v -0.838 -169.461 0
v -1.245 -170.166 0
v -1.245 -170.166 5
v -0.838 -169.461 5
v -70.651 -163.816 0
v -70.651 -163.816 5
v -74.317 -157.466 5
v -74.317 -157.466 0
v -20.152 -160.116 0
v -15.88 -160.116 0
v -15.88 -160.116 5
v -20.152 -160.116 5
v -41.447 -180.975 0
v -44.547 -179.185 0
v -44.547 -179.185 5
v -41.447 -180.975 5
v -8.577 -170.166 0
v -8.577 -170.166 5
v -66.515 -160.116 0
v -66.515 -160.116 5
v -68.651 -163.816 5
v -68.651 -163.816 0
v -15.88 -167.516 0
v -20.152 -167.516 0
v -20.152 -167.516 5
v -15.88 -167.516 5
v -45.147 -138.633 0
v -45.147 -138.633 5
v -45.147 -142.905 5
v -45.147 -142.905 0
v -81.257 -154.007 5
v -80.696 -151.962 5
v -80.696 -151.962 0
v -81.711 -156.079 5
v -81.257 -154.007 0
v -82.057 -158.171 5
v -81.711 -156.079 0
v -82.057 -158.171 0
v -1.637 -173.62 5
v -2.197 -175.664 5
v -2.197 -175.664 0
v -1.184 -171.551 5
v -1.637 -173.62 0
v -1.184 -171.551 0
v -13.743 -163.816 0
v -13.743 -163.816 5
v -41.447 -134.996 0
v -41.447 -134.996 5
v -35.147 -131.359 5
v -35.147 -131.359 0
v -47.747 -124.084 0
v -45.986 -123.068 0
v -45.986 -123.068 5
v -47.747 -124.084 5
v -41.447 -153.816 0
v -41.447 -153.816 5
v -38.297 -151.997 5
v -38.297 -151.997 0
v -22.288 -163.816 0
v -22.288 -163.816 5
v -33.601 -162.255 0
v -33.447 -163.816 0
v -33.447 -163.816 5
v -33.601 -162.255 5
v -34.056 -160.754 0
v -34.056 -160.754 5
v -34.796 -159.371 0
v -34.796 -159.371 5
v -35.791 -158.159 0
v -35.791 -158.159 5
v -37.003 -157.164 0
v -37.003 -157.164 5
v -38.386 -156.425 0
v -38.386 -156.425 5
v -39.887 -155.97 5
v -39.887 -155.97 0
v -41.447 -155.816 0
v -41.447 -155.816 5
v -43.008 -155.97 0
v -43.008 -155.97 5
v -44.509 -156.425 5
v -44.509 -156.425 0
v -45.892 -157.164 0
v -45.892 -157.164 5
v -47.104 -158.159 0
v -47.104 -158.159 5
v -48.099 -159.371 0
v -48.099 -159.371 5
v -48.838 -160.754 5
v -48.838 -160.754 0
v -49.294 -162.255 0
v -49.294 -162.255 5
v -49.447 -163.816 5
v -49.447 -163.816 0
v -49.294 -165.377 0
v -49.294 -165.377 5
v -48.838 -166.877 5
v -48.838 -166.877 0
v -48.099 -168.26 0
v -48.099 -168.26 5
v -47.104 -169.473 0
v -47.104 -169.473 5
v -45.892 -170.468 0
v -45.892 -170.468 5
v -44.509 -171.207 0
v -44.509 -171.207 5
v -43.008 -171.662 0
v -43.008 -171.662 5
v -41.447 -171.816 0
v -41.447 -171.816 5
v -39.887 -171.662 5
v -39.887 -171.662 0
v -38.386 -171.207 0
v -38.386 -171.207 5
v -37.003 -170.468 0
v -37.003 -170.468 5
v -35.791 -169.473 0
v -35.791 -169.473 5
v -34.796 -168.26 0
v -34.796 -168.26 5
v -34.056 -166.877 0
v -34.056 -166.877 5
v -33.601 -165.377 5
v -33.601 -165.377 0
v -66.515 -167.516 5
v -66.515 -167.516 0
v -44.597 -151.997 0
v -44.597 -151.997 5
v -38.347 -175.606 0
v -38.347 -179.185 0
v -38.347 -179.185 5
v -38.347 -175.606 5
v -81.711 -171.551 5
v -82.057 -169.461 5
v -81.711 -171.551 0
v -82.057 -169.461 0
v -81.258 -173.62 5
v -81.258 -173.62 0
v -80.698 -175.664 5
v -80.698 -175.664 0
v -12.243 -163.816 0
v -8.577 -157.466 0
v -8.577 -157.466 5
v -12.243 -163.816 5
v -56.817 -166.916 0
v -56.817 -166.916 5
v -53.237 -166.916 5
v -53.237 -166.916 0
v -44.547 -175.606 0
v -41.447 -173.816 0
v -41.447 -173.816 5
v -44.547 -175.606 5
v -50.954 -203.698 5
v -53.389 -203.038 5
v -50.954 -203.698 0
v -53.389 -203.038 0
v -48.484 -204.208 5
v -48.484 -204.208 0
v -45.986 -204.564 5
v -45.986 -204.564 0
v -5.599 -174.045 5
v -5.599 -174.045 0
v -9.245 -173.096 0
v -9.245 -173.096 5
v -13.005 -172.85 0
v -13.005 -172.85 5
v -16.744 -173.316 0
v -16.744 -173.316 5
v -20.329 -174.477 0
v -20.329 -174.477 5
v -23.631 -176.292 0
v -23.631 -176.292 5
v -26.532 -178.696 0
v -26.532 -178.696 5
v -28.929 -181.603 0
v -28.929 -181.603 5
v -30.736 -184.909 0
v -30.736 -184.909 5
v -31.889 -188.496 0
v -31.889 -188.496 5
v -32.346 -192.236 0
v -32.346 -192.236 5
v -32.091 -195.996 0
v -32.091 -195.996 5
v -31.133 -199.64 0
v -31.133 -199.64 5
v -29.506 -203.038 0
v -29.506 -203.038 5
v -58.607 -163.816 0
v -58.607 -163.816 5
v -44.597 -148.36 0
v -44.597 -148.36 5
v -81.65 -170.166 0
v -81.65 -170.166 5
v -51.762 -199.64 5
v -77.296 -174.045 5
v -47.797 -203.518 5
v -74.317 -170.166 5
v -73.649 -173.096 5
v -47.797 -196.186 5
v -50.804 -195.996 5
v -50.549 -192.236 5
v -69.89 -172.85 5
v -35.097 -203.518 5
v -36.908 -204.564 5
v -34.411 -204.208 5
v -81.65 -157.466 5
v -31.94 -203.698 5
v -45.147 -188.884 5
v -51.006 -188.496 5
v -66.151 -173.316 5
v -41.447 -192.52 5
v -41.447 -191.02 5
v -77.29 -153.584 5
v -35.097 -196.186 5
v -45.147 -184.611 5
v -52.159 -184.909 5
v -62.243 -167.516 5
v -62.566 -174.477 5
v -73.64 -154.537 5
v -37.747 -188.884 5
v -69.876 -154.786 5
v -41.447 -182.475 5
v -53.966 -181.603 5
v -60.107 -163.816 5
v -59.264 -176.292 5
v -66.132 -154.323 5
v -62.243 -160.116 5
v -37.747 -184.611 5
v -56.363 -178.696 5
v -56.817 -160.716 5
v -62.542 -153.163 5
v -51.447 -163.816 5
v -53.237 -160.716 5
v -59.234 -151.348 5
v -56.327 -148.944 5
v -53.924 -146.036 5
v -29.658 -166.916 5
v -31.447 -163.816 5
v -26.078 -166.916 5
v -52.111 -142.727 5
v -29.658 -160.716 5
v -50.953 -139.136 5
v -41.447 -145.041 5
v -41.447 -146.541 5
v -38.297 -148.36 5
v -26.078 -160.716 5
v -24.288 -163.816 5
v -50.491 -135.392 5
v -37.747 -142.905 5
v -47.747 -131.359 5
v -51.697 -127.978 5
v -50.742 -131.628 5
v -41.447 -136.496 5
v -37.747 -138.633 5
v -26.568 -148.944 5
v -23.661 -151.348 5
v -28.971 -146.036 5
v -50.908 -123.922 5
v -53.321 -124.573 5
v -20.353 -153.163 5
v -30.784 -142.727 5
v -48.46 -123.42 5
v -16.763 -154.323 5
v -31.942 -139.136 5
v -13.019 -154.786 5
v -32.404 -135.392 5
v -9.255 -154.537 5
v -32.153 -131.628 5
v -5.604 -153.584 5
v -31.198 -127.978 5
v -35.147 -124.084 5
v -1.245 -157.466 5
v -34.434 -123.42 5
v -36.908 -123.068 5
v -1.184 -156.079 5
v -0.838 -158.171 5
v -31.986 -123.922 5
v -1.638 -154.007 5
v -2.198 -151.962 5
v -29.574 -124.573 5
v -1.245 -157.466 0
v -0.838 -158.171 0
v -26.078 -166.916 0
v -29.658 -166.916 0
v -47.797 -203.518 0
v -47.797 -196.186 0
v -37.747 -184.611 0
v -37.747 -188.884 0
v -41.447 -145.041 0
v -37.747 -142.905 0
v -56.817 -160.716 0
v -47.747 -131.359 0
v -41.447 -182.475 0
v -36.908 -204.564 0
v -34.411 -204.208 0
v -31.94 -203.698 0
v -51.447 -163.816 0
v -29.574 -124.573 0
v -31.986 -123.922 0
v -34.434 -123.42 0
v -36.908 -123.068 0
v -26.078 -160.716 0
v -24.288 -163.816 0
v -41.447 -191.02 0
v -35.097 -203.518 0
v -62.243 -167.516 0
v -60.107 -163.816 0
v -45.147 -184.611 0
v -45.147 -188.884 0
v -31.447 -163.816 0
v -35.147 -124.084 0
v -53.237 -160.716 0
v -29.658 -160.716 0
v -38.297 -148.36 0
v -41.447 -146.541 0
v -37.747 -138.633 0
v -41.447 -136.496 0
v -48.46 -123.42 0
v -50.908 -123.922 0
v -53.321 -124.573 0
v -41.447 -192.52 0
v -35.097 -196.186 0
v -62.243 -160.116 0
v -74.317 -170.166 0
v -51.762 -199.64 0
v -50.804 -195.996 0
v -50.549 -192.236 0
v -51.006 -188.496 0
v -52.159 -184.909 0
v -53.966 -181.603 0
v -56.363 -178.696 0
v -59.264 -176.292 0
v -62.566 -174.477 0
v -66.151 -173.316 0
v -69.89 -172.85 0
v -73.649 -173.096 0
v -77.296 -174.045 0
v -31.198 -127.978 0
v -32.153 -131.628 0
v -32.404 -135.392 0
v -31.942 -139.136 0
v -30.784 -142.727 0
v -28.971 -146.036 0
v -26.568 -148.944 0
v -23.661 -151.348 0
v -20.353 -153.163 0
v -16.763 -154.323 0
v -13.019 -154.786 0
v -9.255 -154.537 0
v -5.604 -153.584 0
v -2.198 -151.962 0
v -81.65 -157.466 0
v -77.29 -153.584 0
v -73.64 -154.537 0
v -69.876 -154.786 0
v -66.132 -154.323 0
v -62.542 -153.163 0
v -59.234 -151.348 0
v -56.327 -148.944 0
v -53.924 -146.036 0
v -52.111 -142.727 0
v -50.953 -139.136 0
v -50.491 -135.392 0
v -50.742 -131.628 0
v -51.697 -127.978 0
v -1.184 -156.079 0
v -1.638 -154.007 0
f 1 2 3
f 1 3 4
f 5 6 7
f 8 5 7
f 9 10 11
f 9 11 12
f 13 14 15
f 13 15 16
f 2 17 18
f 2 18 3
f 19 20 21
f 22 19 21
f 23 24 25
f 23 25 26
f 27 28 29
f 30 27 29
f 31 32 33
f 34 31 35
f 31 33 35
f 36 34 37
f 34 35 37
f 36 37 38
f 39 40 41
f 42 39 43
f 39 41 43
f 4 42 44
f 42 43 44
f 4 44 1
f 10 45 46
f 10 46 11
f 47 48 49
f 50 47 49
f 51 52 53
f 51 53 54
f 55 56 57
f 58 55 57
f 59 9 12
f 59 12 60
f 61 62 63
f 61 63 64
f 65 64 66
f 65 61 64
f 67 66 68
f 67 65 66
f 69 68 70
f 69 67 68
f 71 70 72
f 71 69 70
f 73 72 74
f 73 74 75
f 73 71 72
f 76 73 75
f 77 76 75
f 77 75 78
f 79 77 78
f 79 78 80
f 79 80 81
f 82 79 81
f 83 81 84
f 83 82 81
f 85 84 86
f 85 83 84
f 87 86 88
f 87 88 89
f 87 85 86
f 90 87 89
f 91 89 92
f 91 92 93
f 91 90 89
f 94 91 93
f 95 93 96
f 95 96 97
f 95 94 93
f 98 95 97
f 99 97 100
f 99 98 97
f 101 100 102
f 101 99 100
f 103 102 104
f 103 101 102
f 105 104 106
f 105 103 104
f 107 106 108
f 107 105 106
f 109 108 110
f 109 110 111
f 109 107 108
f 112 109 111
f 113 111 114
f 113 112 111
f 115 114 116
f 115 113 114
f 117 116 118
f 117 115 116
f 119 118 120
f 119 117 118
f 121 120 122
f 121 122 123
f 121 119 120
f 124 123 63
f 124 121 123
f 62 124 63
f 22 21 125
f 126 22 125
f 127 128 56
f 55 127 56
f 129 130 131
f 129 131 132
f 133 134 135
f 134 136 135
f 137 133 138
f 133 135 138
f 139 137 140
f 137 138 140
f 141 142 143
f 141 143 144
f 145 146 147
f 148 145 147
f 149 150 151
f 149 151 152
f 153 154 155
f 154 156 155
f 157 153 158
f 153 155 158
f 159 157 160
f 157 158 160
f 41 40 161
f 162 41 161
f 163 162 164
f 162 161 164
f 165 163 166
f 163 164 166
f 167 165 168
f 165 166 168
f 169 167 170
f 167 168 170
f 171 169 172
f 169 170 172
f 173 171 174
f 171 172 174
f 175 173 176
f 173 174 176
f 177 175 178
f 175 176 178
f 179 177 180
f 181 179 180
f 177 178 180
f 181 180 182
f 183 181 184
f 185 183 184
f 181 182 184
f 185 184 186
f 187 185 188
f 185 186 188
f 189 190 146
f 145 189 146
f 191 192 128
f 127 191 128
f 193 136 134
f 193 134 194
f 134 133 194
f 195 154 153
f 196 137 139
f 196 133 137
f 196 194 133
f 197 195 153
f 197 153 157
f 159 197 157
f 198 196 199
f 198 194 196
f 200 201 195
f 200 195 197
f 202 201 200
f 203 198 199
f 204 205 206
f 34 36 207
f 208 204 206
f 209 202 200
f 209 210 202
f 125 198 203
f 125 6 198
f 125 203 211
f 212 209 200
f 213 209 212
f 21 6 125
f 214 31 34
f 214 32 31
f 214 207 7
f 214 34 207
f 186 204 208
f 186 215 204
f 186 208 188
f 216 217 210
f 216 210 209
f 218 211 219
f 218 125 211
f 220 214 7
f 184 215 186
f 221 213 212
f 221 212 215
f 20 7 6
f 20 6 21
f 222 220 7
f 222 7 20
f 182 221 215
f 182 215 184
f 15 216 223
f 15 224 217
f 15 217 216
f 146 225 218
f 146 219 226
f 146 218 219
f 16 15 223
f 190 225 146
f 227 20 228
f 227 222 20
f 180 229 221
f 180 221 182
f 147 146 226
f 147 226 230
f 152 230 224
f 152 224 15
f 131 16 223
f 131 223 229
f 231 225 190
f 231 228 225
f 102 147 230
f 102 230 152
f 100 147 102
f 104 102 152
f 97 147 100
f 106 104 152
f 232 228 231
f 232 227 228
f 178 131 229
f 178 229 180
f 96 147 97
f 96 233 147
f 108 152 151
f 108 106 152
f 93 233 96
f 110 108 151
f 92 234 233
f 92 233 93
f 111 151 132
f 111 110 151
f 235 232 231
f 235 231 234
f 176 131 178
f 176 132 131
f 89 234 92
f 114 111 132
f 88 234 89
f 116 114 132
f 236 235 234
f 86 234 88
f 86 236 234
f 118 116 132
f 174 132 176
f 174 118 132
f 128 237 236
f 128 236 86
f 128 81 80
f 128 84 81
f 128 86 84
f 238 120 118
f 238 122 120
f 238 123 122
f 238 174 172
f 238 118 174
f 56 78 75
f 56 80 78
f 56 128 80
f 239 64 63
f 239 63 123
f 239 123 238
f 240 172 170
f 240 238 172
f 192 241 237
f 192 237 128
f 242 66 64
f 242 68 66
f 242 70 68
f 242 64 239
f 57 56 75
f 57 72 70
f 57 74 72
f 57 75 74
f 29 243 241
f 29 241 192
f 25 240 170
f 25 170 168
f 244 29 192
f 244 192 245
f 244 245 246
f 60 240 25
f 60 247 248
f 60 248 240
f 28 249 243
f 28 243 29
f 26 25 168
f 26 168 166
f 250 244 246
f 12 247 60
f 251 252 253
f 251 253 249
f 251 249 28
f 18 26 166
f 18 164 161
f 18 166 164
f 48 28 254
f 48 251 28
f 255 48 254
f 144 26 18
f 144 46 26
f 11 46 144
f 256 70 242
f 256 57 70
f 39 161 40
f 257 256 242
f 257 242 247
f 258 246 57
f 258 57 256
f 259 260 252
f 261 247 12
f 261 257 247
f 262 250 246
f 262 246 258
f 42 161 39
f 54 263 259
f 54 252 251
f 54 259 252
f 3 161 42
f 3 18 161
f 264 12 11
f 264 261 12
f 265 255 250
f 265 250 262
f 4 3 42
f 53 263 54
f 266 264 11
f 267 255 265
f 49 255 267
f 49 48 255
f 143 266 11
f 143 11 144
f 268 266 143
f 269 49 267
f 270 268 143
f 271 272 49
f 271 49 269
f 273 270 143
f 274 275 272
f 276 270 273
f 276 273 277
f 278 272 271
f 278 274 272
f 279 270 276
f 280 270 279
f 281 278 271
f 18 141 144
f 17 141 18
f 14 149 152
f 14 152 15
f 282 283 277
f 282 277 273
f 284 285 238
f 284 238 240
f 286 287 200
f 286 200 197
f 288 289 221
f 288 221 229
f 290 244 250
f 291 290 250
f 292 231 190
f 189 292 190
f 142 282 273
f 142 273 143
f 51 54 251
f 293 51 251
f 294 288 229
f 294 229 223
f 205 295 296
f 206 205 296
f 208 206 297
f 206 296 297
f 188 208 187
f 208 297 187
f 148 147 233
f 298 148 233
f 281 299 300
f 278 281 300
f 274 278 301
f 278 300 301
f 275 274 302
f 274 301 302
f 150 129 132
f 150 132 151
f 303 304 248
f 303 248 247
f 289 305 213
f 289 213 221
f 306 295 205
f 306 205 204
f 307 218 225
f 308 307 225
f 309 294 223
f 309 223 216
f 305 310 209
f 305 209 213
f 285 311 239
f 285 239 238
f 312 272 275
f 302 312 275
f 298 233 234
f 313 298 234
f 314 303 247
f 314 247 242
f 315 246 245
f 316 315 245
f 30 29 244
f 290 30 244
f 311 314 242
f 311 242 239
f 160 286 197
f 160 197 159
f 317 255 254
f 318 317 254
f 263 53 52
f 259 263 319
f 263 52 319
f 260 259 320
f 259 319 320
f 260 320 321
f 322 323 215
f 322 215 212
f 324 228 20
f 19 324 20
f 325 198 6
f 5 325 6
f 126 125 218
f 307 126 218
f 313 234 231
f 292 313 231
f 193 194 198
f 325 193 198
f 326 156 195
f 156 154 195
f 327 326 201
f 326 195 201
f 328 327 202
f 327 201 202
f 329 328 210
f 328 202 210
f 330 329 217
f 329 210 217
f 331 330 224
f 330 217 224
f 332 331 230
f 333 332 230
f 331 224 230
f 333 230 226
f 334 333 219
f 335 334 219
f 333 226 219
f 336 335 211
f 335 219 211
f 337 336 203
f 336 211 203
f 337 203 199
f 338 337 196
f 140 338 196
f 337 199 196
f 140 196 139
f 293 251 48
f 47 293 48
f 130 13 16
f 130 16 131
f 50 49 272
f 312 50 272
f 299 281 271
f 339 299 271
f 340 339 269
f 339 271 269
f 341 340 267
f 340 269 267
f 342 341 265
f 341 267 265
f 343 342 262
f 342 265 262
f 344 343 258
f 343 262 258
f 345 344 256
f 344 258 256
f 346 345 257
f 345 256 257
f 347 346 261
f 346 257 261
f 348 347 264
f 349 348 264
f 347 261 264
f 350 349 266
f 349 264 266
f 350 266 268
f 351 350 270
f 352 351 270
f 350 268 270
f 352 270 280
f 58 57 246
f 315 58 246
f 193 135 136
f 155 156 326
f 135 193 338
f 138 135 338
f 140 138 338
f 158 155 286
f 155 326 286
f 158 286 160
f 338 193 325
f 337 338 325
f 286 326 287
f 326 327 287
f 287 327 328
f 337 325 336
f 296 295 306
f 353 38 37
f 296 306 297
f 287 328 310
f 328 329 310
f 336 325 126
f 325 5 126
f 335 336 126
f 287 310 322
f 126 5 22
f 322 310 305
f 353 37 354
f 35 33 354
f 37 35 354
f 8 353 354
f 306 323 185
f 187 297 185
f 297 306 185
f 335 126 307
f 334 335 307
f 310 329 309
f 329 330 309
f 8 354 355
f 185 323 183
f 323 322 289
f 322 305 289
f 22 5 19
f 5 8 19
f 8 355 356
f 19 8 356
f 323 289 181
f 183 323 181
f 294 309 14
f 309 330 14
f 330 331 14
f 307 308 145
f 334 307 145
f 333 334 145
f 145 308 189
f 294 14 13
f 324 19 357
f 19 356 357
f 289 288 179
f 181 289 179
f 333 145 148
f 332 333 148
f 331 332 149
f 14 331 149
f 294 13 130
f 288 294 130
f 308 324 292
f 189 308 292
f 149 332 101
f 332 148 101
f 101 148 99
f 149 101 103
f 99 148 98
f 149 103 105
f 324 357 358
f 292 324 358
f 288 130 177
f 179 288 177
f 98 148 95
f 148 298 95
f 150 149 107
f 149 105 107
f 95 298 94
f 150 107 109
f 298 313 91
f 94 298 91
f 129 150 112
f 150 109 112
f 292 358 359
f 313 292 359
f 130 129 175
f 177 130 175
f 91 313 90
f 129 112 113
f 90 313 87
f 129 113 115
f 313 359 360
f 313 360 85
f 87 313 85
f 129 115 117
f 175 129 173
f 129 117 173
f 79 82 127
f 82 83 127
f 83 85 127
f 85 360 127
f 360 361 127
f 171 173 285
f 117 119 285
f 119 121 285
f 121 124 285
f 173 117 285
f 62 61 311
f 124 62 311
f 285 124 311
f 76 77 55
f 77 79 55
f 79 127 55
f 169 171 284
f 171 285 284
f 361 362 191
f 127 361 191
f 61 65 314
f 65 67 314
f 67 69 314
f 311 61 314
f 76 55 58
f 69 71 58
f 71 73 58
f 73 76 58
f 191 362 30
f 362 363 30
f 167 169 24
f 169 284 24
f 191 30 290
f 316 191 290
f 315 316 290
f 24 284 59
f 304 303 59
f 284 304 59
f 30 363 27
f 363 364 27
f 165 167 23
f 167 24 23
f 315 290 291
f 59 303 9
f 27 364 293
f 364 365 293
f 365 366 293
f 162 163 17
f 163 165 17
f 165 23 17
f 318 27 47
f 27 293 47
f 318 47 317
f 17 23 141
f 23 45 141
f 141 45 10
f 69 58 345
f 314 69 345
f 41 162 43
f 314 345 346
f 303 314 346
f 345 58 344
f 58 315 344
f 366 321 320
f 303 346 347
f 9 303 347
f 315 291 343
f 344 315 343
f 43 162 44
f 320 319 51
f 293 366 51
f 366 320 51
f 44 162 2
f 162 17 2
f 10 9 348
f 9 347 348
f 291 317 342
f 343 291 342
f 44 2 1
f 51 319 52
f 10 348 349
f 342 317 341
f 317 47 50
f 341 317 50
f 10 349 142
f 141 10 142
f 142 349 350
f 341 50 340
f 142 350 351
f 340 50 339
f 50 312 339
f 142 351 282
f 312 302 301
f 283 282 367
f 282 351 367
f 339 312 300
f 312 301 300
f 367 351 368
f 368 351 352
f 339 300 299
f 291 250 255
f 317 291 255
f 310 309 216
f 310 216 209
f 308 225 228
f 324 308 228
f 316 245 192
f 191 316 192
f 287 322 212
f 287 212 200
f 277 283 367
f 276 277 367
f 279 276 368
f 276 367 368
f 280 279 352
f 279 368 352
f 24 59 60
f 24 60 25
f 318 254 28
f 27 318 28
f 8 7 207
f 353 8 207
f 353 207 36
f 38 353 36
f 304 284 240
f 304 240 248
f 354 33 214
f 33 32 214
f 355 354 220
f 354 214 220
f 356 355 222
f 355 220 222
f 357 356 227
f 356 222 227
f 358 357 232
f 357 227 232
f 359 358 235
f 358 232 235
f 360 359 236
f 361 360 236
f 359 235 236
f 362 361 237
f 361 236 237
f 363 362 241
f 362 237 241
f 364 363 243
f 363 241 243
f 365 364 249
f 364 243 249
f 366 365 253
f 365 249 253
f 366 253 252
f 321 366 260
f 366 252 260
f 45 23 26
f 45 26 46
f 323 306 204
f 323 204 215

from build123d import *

# Parameters (mm, degrees)
F0_R      = 41
F0_R_2    = 8
F2_DEPTH  = 5
F5_DEPTH  = 5.001
F7_DEPTH  = 5.001
F9_DEPTH  = 5.001
F11_DEPTH = 5.001
F13_DEPTH = 5.001
F15_DEPTH = 25
F16_R     = 8
F17_DEPTH = 5.001
F19_DEPTH = 5.001
F21_DEPTH = 5.001
F22_R     = 8
F23_DEPTH = 5.001
F24_R     = 8
F25_DEPTH = 5.001
F26_R     = 8
F27_DEPTH = 5.001
F28_R     = 19.931343
F29_DEPTH = 5.001
F30_R     = 19.962779
F31_DEPTH = 5.001
F32_R     = 19.962779
F33_DEPTH = 5.001
F34_R     = 19.931343
F35_DEPTH = 5.001


with BuildPart() as f2:
    # F0 (on Top) → F2 (new body)
    with BuildSketch(Plane.XY):
        with Locations((-41.447371, -163.815796)):
            Circle(F0_R)
        with Locations((-41.447371, -163.815796)):
            Circle(F0_R_2, mode=Mode.SUBTRACT)
    extrude(amount=F2_DEPTH)

    # F4 (on face) → F5 (cut, through all)
    with BuildSketch(Plane.XY.offset(5)):
        Polygon((-38.297371, -151.997143), (-38.297371, -148.359836), (-41.447371, -146.541183), (-44.597371, -148.359836), (-44.597371, -151.997143), (-41.447371, -153.815796), align=None)
    extrude(amount=-F5_DEPTH, mode=Mode.SUBTRACT)

    # F6 (on face) → F7 (cut, through all)
    with BuildSketch(Plane.XY.offset(5)):
        Polygon((-37.747371, -142.904987), (-37.747371, -138.632595), (-41.447371, -136.496399), (-45.147371, -138.632595), (-45.147371, -142.904987), (-41.447371, -145.041183), align=None)
    extrude(amount=-F7_DEPTH, mode=Mode.SUBTRACT)

    # F8 (on face) → F9 (cut, through all)
    with BuildSketch(Plane.XY.offset(5)):
        Polygon((-47.747371, -131.359092), (-41.447371, -134.996399), (-35.147371, -131.359092), (-35.147371, -124.084479), (-41.447371, -120.447172), (-47.747371, -124.084479), align=None)
    extrude(amount=-F9_DEPTH, mode=Mode.SUBTRACT)

    # F10 (on face) → F11 (cut, through all)
    with BuildSketch(Plane.XY):
        Polygon((-38.347371, -175.605582), (-41.447371, -173.815796), (-44.547371, -175.605582), (-44.547371, -179.185154), (-41.447371, -180.97494), (-38.347371, -179.185154), align=None)
    extrude(amount=F11_DEPTH, mode=Mode.SUBTRACT)

    # F12 (on face) → F13 (cut, through all)
    with BuildSketch(Plane.XY):
        Polygon((-37.747371, -184.611136), (-41.447371, -182.47494), (-45.147371, -184.611136), (-45.147371, -188.883528), (-41.447371, -191.019724), (-37.747371, -188.883528), align=None)
    extrude(amount=F13_DEPTH, mode=Mode.SUBTRACT)

    # F14 (on face) → F15 (cut)
    with BuildSketch(Plane.XY):
        with BuildLine():
            Line((-35.097371, -196.185898), (-41.447371, -192.519724))
            Line((-41.447371, -192.519724), (-47.797371, -196.185898))
            Line((-47.797371, -196.185898), (-47.797371, -203.518246))
            Line((-47.797371, -203.518246), (-45.986492, -204.563758))
            ThreePointArc((-45.986492, -204.563758), (-41.447371, -204.815796), (-36.908251, -204.563758))
            Line((-36.908251, -204.563758), (-35.097371, -203.518246))
            Line((-35.097371, -203.518246), (-35.097371, -196.185898))
        make_face()
    extrude(amount=F15_DEPTH, mode=Mode.SUBTRACT)

    # F16 (on face) → F17 (cut, through all)
    with BuildSketch(Plane.XY):
        with Locations((-41.447371, -163.815796)):
            Circle(F16_R)
        Polygon((-24.288228, -163.815796), (-26.078014, -160.715796), (-29.657585, -160.715796), (-31.447371, -163.815796), align=None)
        Polygon((-26.078014, -166.915796), (-24.288228, -163.815796), (-31.447371, -163.815796), (-29.657585, -166.915796), align=None)
    extrude(amount=F17_DEPTH, mode=Mode.SUBTRACT)

    # F18 (on face) → F19 (cut, through all)
    with BuildSketch(Plane.XY):
        Polygon((-15.87964, -160.115796), (-20.152032, -160.115796), (-22.288228, -163.815796), (-20.152032, -167.515796), (-15.87964, -167.515796), (-13.743444, -163.815796), align=None)
    extrude(amount=F19_DEPTH, mode=Mode.SUBTRACT)

    # F20 (on face) → F21 (cut, through all)
    with BuildSketch(Plane.XY):
        with BuildLine():
            Line((-0.837825, -158.170907), (-1.244921, -157.465796))
            Line((-1.244921, -157.465796), (-8.57727, -157.465796))
            Line((-8.57727, -157.465796), (-12.243444, -163.815796))
            Line((-12.243444, -163.815796), (-8.57727, -170.165796))
            Line((-8.57727, -170.165796), (-1.244921, -170.165796))
            Line((-1.244921, -170.165796), (-0.837825, -169.460685))
            ThreePointArc((-0.837825, -169.460685), (-0.545101, -166.644985), (-0.447371, -163.815796))
            ThreePointArc((-0.447371, -163.815796), (-0.545101, -160.986608), (-0.837825, -158.170907))
        make_face()
    extrude(amount=F21_DEPTH, mode=Mode.SUBTRACT)

    # F22 (on face) → F23 (cut, through all)
    with BuildSketch(Plane.XY.offset(5)):
        Polygon((-53.237157, -160.715796), (-56.816729, -160.715796), (-58.606515, -163.815796), (-56.816729, -166.915796), (-53.237157, -166.915796), (-51.447371, -163.815796), align=None)
        with Locations((-41.447371, -163.815796)):
            Circle(F22_R)
    extrude(amount=-F23_DEPTH, mode=Mode.SUBTRACT)

    # F24 (on face) → F25 (cut, through all)
    with BuildSketch(Plane.XY.offset(5)):
        Polygon((-60.106515, -163.815796), (-62.242711, -160.115796), (-66.515103, -160.115796), (-68.651299, -163.815796), (-66.515103, -167.515796), (-62.242711, -167.515796), align=None)
        with Locations((-41.447371, -163.815796)):
            Circle(F24_R)
    extrude(amount=-F25_DEPTH, mode=Mode.SUBTRACT)

    # F26 (on face) → F27 (cut, through all)
    with BuildSketch(Plane.XY.offset(5)):
        Polygon((-85.315995, -163.815796), (-81.649821, -170.165796), (-74.317473, -170.165796), (-70.651299, -163.815796), (-74.317473, -157.465796), (-81.649821, -157.465796), align=None)
        with Locations((-41.447371, -163.815796)):
            Circle(F26_R)
    extrude(amount=-F27_DEPTH, mode=Mode.SUBTRACT)

    # F28 (on face) → F29 (cut, through all)
    with BuildSketch(Plane.XY.offset(5)):
        with Locations((-70.473262, -192.772621)):
            Circle(F28_R)
    extrude(amount=-F29_DEPTH, mode=Mode.SUBTRACT)

    # F30 (on face) → F31 (cut, through all)
    with BuildSketch(Plane.XY.offset(5)):
        with Locations((-70.446051, -134.831722)):
            Circle(F30_R)
    extrude(amount=-F31_DEPTH, mode=Mode.SUBTRACT)

    # F32 (on face) → F33 (cut, through all)
    with BuildSketch(Plane.XY.offset(5)):
        with Locations((-12.448691, -134.831722)):
            Circle(F32_R)
    extrude(amount=-F33_DEPTH, mode=Mode.SUBTRACT)

    # F34 (on face) → F35 (cut, through all)
    with BuildSketch(Plane.XY.offset(5)):
        with Locations((-12.421481, -192.772621)):
            Circle(F34_R)
    extrude(amount=-F35_DEPTH, mode=Mode.SUBTRACT)


solid = f2.part
